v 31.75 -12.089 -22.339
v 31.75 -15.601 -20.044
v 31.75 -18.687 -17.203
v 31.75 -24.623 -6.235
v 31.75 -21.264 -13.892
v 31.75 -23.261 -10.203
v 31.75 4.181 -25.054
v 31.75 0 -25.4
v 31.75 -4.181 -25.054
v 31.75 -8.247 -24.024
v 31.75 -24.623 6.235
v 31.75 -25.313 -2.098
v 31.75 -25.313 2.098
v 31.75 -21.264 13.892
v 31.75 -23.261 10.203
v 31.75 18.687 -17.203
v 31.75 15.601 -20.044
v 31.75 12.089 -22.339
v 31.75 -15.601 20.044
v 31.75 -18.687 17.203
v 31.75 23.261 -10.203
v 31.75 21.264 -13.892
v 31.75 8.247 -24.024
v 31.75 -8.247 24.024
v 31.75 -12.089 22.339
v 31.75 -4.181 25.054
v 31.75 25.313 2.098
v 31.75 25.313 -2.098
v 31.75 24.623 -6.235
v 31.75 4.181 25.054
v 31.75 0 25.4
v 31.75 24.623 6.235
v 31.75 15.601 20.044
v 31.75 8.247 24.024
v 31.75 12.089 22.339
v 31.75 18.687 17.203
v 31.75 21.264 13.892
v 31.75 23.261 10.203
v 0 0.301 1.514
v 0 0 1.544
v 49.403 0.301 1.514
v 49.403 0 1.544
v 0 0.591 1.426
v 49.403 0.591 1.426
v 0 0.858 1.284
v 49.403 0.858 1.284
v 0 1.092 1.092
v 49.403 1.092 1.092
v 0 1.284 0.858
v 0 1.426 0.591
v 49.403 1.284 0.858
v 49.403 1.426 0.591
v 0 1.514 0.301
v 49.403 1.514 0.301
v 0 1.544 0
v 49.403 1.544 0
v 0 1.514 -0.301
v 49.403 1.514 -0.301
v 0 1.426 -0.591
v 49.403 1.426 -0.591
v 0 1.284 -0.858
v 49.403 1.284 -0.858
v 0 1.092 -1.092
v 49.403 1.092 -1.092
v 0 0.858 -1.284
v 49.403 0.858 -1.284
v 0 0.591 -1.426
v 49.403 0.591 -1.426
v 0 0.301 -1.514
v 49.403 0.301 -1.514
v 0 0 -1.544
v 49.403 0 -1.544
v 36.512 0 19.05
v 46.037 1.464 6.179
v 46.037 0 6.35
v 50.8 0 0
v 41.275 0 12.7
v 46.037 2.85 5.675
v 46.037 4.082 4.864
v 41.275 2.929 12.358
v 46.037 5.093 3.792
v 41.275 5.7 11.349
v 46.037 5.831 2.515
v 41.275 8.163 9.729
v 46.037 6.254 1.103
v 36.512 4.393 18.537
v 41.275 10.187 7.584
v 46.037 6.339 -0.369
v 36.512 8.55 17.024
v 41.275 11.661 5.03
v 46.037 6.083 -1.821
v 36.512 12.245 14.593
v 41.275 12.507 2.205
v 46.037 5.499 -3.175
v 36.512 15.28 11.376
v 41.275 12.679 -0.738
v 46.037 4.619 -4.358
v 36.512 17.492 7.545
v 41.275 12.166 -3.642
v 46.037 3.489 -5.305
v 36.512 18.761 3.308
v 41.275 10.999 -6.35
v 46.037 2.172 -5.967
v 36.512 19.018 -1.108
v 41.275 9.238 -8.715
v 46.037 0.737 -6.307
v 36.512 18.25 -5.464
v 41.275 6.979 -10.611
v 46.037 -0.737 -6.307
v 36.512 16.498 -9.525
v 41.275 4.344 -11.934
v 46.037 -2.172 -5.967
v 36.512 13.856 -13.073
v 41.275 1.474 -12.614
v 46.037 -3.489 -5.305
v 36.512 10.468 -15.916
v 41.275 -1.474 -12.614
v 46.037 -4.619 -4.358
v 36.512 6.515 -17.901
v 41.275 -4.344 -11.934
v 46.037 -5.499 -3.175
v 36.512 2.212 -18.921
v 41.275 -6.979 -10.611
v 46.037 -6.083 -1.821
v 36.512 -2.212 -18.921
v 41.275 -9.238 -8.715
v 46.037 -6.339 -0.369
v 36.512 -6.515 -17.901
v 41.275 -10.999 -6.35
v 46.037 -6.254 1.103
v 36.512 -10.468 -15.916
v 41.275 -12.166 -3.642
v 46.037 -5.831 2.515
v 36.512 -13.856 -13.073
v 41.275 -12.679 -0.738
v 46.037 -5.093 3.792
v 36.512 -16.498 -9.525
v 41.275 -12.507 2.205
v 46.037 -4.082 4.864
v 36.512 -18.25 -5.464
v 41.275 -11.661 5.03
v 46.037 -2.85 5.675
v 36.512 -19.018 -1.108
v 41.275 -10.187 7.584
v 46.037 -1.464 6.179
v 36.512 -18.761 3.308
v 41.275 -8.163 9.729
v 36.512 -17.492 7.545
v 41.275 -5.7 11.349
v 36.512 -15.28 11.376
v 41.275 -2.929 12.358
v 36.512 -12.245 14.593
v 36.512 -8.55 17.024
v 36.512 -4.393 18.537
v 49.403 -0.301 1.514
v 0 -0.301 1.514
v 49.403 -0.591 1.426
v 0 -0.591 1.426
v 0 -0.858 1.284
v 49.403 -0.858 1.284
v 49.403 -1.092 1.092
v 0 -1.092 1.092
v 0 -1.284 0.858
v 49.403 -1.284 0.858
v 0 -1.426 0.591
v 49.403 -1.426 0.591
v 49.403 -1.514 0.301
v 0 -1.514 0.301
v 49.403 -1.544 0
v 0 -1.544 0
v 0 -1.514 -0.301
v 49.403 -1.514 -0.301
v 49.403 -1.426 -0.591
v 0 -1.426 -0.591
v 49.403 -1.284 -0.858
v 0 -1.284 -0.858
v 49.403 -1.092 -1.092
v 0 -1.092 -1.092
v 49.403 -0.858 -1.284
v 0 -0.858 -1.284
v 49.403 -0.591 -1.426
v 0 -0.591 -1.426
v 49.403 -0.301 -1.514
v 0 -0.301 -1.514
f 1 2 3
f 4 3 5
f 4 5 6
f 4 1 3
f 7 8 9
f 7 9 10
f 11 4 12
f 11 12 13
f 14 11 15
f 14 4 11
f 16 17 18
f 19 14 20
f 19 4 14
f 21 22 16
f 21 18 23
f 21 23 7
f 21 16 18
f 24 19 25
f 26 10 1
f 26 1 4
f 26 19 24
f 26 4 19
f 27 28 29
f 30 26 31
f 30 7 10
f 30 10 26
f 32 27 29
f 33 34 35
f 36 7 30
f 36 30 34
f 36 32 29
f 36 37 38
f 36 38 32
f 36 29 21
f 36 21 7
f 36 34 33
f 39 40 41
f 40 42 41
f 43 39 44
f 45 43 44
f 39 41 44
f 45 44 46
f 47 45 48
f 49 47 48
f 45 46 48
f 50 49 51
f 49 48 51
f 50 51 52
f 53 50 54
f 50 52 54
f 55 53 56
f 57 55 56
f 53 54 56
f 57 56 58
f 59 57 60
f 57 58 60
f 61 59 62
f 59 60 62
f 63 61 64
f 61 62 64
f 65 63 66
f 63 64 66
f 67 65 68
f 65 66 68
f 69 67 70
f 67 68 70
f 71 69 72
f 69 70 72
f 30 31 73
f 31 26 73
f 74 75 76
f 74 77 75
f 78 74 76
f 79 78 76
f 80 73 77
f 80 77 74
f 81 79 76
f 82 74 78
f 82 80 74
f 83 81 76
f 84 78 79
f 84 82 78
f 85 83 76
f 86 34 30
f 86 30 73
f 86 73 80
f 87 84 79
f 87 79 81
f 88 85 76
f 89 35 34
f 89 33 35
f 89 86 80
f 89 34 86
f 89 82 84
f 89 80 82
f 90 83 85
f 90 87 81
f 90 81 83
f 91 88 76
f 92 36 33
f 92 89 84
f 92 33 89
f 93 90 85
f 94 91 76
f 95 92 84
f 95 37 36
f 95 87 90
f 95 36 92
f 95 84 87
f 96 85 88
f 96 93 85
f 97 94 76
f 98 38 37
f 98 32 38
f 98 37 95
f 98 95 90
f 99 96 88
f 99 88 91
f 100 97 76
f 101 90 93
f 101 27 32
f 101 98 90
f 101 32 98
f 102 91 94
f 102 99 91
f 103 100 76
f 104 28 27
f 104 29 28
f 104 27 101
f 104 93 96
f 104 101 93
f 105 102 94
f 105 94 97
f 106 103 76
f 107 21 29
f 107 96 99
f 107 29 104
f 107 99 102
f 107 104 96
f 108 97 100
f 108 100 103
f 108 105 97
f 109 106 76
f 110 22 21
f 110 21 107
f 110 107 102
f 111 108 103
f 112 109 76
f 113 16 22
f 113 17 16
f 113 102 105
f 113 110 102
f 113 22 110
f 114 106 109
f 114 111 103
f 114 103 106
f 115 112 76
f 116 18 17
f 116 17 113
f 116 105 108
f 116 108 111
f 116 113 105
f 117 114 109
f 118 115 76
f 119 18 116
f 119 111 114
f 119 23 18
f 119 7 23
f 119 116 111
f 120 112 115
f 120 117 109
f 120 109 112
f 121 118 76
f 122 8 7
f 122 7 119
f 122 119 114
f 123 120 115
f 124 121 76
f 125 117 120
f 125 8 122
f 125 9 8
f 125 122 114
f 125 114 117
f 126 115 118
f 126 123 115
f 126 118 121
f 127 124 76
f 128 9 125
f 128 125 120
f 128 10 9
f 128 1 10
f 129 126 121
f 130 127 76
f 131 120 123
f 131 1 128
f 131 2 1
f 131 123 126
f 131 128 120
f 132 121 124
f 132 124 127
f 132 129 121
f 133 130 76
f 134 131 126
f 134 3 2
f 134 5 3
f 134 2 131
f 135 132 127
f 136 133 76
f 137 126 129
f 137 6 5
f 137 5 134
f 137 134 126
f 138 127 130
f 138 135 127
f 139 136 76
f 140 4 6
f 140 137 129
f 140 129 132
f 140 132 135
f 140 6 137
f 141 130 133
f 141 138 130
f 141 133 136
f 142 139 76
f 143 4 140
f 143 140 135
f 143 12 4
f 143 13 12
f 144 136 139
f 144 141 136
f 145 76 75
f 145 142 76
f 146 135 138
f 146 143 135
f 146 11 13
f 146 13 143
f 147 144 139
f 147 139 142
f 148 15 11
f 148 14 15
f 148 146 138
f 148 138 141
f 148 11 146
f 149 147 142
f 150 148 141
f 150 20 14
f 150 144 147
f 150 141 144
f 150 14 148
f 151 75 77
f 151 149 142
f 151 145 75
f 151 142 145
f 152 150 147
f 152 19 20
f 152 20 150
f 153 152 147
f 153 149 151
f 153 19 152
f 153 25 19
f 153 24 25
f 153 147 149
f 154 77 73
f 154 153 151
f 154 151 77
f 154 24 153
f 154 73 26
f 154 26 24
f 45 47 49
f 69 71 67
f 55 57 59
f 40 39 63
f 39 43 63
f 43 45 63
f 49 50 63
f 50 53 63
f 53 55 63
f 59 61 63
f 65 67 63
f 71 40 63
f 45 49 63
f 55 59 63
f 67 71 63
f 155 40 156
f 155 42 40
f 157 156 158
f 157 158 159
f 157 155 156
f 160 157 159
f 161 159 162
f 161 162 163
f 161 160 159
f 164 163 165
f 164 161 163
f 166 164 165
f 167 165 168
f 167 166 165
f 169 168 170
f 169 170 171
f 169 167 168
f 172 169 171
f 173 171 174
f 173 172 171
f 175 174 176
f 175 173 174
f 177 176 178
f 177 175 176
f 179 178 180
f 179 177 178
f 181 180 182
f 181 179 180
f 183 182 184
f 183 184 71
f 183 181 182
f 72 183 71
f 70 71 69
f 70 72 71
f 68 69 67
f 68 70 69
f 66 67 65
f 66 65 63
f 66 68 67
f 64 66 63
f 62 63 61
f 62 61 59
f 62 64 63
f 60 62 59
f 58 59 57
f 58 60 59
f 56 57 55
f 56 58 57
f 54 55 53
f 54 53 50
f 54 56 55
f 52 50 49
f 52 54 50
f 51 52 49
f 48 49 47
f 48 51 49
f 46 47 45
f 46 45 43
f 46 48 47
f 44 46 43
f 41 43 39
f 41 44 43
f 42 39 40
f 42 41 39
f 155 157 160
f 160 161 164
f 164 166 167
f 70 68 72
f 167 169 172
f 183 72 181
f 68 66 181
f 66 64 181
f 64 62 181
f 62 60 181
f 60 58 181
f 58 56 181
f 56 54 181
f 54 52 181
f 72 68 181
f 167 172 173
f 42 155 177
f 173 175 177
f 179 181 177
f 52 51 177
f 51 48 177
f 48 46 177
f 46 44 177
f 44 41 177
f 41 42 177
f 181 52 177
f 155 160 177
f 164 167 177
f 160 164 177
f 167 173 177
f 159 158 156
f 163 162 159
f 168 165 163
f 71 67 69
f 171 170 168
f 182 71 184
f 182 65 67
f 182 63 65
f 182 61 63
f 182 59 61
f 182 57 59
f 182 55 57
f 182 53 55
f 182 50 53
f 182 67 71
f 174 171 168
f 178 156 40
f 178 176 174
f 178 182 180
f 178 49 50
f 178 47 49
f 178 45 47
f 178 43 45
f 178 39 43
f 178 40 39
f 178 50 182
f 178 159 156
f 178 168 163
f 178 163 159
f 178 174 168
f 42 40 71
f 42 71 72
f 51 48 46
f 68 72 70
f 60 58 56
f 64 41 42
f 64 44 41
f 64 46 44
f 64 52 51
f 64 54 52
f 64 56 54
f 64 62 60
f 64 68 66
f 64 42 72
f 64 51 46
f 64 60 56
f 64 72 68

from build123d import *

# Parameters (mm, degrees)
F0_W     = 49.403
F0_H     = 1.543844
F4_ANGLE = 180


with BuildPart() as f1:
    # F0 (on Front) → F1 (revolve)
    with BuildSketch(Plane.XZ):
        with Locations((24.7015, 0.771922)):
            Rectangle(F0_W, F0_H)
    revolve(axis=Axis((24.7015, 0, 0), (1, 0, 0)))


with BuildPart() as f3:
    # F2 (on Front) → F3 (revolve)
    with BuildSketch(Plane.XZ):
        Polygon((31.75, 25.4), (31.75, 0), (50.8, 0), align=None)
    revolve(axis=Axis((41.275, 0, 0), (-1, 0, 0)))


with BuildPart() as f4:
    # F0 (on Front) → F4 (revolve)
    with BuildSketch(Plane.XZ):
        with Locations((24.7015, 0.771922)):
            Rectangle(F0_W, F0_H)
    revolve(axis=Axis((41.275, 0, 0), (-1, 0, 0)), revolution_arc=F4_ANGLE)


solid = Compound([f1.part, f3.part, f4.part])
